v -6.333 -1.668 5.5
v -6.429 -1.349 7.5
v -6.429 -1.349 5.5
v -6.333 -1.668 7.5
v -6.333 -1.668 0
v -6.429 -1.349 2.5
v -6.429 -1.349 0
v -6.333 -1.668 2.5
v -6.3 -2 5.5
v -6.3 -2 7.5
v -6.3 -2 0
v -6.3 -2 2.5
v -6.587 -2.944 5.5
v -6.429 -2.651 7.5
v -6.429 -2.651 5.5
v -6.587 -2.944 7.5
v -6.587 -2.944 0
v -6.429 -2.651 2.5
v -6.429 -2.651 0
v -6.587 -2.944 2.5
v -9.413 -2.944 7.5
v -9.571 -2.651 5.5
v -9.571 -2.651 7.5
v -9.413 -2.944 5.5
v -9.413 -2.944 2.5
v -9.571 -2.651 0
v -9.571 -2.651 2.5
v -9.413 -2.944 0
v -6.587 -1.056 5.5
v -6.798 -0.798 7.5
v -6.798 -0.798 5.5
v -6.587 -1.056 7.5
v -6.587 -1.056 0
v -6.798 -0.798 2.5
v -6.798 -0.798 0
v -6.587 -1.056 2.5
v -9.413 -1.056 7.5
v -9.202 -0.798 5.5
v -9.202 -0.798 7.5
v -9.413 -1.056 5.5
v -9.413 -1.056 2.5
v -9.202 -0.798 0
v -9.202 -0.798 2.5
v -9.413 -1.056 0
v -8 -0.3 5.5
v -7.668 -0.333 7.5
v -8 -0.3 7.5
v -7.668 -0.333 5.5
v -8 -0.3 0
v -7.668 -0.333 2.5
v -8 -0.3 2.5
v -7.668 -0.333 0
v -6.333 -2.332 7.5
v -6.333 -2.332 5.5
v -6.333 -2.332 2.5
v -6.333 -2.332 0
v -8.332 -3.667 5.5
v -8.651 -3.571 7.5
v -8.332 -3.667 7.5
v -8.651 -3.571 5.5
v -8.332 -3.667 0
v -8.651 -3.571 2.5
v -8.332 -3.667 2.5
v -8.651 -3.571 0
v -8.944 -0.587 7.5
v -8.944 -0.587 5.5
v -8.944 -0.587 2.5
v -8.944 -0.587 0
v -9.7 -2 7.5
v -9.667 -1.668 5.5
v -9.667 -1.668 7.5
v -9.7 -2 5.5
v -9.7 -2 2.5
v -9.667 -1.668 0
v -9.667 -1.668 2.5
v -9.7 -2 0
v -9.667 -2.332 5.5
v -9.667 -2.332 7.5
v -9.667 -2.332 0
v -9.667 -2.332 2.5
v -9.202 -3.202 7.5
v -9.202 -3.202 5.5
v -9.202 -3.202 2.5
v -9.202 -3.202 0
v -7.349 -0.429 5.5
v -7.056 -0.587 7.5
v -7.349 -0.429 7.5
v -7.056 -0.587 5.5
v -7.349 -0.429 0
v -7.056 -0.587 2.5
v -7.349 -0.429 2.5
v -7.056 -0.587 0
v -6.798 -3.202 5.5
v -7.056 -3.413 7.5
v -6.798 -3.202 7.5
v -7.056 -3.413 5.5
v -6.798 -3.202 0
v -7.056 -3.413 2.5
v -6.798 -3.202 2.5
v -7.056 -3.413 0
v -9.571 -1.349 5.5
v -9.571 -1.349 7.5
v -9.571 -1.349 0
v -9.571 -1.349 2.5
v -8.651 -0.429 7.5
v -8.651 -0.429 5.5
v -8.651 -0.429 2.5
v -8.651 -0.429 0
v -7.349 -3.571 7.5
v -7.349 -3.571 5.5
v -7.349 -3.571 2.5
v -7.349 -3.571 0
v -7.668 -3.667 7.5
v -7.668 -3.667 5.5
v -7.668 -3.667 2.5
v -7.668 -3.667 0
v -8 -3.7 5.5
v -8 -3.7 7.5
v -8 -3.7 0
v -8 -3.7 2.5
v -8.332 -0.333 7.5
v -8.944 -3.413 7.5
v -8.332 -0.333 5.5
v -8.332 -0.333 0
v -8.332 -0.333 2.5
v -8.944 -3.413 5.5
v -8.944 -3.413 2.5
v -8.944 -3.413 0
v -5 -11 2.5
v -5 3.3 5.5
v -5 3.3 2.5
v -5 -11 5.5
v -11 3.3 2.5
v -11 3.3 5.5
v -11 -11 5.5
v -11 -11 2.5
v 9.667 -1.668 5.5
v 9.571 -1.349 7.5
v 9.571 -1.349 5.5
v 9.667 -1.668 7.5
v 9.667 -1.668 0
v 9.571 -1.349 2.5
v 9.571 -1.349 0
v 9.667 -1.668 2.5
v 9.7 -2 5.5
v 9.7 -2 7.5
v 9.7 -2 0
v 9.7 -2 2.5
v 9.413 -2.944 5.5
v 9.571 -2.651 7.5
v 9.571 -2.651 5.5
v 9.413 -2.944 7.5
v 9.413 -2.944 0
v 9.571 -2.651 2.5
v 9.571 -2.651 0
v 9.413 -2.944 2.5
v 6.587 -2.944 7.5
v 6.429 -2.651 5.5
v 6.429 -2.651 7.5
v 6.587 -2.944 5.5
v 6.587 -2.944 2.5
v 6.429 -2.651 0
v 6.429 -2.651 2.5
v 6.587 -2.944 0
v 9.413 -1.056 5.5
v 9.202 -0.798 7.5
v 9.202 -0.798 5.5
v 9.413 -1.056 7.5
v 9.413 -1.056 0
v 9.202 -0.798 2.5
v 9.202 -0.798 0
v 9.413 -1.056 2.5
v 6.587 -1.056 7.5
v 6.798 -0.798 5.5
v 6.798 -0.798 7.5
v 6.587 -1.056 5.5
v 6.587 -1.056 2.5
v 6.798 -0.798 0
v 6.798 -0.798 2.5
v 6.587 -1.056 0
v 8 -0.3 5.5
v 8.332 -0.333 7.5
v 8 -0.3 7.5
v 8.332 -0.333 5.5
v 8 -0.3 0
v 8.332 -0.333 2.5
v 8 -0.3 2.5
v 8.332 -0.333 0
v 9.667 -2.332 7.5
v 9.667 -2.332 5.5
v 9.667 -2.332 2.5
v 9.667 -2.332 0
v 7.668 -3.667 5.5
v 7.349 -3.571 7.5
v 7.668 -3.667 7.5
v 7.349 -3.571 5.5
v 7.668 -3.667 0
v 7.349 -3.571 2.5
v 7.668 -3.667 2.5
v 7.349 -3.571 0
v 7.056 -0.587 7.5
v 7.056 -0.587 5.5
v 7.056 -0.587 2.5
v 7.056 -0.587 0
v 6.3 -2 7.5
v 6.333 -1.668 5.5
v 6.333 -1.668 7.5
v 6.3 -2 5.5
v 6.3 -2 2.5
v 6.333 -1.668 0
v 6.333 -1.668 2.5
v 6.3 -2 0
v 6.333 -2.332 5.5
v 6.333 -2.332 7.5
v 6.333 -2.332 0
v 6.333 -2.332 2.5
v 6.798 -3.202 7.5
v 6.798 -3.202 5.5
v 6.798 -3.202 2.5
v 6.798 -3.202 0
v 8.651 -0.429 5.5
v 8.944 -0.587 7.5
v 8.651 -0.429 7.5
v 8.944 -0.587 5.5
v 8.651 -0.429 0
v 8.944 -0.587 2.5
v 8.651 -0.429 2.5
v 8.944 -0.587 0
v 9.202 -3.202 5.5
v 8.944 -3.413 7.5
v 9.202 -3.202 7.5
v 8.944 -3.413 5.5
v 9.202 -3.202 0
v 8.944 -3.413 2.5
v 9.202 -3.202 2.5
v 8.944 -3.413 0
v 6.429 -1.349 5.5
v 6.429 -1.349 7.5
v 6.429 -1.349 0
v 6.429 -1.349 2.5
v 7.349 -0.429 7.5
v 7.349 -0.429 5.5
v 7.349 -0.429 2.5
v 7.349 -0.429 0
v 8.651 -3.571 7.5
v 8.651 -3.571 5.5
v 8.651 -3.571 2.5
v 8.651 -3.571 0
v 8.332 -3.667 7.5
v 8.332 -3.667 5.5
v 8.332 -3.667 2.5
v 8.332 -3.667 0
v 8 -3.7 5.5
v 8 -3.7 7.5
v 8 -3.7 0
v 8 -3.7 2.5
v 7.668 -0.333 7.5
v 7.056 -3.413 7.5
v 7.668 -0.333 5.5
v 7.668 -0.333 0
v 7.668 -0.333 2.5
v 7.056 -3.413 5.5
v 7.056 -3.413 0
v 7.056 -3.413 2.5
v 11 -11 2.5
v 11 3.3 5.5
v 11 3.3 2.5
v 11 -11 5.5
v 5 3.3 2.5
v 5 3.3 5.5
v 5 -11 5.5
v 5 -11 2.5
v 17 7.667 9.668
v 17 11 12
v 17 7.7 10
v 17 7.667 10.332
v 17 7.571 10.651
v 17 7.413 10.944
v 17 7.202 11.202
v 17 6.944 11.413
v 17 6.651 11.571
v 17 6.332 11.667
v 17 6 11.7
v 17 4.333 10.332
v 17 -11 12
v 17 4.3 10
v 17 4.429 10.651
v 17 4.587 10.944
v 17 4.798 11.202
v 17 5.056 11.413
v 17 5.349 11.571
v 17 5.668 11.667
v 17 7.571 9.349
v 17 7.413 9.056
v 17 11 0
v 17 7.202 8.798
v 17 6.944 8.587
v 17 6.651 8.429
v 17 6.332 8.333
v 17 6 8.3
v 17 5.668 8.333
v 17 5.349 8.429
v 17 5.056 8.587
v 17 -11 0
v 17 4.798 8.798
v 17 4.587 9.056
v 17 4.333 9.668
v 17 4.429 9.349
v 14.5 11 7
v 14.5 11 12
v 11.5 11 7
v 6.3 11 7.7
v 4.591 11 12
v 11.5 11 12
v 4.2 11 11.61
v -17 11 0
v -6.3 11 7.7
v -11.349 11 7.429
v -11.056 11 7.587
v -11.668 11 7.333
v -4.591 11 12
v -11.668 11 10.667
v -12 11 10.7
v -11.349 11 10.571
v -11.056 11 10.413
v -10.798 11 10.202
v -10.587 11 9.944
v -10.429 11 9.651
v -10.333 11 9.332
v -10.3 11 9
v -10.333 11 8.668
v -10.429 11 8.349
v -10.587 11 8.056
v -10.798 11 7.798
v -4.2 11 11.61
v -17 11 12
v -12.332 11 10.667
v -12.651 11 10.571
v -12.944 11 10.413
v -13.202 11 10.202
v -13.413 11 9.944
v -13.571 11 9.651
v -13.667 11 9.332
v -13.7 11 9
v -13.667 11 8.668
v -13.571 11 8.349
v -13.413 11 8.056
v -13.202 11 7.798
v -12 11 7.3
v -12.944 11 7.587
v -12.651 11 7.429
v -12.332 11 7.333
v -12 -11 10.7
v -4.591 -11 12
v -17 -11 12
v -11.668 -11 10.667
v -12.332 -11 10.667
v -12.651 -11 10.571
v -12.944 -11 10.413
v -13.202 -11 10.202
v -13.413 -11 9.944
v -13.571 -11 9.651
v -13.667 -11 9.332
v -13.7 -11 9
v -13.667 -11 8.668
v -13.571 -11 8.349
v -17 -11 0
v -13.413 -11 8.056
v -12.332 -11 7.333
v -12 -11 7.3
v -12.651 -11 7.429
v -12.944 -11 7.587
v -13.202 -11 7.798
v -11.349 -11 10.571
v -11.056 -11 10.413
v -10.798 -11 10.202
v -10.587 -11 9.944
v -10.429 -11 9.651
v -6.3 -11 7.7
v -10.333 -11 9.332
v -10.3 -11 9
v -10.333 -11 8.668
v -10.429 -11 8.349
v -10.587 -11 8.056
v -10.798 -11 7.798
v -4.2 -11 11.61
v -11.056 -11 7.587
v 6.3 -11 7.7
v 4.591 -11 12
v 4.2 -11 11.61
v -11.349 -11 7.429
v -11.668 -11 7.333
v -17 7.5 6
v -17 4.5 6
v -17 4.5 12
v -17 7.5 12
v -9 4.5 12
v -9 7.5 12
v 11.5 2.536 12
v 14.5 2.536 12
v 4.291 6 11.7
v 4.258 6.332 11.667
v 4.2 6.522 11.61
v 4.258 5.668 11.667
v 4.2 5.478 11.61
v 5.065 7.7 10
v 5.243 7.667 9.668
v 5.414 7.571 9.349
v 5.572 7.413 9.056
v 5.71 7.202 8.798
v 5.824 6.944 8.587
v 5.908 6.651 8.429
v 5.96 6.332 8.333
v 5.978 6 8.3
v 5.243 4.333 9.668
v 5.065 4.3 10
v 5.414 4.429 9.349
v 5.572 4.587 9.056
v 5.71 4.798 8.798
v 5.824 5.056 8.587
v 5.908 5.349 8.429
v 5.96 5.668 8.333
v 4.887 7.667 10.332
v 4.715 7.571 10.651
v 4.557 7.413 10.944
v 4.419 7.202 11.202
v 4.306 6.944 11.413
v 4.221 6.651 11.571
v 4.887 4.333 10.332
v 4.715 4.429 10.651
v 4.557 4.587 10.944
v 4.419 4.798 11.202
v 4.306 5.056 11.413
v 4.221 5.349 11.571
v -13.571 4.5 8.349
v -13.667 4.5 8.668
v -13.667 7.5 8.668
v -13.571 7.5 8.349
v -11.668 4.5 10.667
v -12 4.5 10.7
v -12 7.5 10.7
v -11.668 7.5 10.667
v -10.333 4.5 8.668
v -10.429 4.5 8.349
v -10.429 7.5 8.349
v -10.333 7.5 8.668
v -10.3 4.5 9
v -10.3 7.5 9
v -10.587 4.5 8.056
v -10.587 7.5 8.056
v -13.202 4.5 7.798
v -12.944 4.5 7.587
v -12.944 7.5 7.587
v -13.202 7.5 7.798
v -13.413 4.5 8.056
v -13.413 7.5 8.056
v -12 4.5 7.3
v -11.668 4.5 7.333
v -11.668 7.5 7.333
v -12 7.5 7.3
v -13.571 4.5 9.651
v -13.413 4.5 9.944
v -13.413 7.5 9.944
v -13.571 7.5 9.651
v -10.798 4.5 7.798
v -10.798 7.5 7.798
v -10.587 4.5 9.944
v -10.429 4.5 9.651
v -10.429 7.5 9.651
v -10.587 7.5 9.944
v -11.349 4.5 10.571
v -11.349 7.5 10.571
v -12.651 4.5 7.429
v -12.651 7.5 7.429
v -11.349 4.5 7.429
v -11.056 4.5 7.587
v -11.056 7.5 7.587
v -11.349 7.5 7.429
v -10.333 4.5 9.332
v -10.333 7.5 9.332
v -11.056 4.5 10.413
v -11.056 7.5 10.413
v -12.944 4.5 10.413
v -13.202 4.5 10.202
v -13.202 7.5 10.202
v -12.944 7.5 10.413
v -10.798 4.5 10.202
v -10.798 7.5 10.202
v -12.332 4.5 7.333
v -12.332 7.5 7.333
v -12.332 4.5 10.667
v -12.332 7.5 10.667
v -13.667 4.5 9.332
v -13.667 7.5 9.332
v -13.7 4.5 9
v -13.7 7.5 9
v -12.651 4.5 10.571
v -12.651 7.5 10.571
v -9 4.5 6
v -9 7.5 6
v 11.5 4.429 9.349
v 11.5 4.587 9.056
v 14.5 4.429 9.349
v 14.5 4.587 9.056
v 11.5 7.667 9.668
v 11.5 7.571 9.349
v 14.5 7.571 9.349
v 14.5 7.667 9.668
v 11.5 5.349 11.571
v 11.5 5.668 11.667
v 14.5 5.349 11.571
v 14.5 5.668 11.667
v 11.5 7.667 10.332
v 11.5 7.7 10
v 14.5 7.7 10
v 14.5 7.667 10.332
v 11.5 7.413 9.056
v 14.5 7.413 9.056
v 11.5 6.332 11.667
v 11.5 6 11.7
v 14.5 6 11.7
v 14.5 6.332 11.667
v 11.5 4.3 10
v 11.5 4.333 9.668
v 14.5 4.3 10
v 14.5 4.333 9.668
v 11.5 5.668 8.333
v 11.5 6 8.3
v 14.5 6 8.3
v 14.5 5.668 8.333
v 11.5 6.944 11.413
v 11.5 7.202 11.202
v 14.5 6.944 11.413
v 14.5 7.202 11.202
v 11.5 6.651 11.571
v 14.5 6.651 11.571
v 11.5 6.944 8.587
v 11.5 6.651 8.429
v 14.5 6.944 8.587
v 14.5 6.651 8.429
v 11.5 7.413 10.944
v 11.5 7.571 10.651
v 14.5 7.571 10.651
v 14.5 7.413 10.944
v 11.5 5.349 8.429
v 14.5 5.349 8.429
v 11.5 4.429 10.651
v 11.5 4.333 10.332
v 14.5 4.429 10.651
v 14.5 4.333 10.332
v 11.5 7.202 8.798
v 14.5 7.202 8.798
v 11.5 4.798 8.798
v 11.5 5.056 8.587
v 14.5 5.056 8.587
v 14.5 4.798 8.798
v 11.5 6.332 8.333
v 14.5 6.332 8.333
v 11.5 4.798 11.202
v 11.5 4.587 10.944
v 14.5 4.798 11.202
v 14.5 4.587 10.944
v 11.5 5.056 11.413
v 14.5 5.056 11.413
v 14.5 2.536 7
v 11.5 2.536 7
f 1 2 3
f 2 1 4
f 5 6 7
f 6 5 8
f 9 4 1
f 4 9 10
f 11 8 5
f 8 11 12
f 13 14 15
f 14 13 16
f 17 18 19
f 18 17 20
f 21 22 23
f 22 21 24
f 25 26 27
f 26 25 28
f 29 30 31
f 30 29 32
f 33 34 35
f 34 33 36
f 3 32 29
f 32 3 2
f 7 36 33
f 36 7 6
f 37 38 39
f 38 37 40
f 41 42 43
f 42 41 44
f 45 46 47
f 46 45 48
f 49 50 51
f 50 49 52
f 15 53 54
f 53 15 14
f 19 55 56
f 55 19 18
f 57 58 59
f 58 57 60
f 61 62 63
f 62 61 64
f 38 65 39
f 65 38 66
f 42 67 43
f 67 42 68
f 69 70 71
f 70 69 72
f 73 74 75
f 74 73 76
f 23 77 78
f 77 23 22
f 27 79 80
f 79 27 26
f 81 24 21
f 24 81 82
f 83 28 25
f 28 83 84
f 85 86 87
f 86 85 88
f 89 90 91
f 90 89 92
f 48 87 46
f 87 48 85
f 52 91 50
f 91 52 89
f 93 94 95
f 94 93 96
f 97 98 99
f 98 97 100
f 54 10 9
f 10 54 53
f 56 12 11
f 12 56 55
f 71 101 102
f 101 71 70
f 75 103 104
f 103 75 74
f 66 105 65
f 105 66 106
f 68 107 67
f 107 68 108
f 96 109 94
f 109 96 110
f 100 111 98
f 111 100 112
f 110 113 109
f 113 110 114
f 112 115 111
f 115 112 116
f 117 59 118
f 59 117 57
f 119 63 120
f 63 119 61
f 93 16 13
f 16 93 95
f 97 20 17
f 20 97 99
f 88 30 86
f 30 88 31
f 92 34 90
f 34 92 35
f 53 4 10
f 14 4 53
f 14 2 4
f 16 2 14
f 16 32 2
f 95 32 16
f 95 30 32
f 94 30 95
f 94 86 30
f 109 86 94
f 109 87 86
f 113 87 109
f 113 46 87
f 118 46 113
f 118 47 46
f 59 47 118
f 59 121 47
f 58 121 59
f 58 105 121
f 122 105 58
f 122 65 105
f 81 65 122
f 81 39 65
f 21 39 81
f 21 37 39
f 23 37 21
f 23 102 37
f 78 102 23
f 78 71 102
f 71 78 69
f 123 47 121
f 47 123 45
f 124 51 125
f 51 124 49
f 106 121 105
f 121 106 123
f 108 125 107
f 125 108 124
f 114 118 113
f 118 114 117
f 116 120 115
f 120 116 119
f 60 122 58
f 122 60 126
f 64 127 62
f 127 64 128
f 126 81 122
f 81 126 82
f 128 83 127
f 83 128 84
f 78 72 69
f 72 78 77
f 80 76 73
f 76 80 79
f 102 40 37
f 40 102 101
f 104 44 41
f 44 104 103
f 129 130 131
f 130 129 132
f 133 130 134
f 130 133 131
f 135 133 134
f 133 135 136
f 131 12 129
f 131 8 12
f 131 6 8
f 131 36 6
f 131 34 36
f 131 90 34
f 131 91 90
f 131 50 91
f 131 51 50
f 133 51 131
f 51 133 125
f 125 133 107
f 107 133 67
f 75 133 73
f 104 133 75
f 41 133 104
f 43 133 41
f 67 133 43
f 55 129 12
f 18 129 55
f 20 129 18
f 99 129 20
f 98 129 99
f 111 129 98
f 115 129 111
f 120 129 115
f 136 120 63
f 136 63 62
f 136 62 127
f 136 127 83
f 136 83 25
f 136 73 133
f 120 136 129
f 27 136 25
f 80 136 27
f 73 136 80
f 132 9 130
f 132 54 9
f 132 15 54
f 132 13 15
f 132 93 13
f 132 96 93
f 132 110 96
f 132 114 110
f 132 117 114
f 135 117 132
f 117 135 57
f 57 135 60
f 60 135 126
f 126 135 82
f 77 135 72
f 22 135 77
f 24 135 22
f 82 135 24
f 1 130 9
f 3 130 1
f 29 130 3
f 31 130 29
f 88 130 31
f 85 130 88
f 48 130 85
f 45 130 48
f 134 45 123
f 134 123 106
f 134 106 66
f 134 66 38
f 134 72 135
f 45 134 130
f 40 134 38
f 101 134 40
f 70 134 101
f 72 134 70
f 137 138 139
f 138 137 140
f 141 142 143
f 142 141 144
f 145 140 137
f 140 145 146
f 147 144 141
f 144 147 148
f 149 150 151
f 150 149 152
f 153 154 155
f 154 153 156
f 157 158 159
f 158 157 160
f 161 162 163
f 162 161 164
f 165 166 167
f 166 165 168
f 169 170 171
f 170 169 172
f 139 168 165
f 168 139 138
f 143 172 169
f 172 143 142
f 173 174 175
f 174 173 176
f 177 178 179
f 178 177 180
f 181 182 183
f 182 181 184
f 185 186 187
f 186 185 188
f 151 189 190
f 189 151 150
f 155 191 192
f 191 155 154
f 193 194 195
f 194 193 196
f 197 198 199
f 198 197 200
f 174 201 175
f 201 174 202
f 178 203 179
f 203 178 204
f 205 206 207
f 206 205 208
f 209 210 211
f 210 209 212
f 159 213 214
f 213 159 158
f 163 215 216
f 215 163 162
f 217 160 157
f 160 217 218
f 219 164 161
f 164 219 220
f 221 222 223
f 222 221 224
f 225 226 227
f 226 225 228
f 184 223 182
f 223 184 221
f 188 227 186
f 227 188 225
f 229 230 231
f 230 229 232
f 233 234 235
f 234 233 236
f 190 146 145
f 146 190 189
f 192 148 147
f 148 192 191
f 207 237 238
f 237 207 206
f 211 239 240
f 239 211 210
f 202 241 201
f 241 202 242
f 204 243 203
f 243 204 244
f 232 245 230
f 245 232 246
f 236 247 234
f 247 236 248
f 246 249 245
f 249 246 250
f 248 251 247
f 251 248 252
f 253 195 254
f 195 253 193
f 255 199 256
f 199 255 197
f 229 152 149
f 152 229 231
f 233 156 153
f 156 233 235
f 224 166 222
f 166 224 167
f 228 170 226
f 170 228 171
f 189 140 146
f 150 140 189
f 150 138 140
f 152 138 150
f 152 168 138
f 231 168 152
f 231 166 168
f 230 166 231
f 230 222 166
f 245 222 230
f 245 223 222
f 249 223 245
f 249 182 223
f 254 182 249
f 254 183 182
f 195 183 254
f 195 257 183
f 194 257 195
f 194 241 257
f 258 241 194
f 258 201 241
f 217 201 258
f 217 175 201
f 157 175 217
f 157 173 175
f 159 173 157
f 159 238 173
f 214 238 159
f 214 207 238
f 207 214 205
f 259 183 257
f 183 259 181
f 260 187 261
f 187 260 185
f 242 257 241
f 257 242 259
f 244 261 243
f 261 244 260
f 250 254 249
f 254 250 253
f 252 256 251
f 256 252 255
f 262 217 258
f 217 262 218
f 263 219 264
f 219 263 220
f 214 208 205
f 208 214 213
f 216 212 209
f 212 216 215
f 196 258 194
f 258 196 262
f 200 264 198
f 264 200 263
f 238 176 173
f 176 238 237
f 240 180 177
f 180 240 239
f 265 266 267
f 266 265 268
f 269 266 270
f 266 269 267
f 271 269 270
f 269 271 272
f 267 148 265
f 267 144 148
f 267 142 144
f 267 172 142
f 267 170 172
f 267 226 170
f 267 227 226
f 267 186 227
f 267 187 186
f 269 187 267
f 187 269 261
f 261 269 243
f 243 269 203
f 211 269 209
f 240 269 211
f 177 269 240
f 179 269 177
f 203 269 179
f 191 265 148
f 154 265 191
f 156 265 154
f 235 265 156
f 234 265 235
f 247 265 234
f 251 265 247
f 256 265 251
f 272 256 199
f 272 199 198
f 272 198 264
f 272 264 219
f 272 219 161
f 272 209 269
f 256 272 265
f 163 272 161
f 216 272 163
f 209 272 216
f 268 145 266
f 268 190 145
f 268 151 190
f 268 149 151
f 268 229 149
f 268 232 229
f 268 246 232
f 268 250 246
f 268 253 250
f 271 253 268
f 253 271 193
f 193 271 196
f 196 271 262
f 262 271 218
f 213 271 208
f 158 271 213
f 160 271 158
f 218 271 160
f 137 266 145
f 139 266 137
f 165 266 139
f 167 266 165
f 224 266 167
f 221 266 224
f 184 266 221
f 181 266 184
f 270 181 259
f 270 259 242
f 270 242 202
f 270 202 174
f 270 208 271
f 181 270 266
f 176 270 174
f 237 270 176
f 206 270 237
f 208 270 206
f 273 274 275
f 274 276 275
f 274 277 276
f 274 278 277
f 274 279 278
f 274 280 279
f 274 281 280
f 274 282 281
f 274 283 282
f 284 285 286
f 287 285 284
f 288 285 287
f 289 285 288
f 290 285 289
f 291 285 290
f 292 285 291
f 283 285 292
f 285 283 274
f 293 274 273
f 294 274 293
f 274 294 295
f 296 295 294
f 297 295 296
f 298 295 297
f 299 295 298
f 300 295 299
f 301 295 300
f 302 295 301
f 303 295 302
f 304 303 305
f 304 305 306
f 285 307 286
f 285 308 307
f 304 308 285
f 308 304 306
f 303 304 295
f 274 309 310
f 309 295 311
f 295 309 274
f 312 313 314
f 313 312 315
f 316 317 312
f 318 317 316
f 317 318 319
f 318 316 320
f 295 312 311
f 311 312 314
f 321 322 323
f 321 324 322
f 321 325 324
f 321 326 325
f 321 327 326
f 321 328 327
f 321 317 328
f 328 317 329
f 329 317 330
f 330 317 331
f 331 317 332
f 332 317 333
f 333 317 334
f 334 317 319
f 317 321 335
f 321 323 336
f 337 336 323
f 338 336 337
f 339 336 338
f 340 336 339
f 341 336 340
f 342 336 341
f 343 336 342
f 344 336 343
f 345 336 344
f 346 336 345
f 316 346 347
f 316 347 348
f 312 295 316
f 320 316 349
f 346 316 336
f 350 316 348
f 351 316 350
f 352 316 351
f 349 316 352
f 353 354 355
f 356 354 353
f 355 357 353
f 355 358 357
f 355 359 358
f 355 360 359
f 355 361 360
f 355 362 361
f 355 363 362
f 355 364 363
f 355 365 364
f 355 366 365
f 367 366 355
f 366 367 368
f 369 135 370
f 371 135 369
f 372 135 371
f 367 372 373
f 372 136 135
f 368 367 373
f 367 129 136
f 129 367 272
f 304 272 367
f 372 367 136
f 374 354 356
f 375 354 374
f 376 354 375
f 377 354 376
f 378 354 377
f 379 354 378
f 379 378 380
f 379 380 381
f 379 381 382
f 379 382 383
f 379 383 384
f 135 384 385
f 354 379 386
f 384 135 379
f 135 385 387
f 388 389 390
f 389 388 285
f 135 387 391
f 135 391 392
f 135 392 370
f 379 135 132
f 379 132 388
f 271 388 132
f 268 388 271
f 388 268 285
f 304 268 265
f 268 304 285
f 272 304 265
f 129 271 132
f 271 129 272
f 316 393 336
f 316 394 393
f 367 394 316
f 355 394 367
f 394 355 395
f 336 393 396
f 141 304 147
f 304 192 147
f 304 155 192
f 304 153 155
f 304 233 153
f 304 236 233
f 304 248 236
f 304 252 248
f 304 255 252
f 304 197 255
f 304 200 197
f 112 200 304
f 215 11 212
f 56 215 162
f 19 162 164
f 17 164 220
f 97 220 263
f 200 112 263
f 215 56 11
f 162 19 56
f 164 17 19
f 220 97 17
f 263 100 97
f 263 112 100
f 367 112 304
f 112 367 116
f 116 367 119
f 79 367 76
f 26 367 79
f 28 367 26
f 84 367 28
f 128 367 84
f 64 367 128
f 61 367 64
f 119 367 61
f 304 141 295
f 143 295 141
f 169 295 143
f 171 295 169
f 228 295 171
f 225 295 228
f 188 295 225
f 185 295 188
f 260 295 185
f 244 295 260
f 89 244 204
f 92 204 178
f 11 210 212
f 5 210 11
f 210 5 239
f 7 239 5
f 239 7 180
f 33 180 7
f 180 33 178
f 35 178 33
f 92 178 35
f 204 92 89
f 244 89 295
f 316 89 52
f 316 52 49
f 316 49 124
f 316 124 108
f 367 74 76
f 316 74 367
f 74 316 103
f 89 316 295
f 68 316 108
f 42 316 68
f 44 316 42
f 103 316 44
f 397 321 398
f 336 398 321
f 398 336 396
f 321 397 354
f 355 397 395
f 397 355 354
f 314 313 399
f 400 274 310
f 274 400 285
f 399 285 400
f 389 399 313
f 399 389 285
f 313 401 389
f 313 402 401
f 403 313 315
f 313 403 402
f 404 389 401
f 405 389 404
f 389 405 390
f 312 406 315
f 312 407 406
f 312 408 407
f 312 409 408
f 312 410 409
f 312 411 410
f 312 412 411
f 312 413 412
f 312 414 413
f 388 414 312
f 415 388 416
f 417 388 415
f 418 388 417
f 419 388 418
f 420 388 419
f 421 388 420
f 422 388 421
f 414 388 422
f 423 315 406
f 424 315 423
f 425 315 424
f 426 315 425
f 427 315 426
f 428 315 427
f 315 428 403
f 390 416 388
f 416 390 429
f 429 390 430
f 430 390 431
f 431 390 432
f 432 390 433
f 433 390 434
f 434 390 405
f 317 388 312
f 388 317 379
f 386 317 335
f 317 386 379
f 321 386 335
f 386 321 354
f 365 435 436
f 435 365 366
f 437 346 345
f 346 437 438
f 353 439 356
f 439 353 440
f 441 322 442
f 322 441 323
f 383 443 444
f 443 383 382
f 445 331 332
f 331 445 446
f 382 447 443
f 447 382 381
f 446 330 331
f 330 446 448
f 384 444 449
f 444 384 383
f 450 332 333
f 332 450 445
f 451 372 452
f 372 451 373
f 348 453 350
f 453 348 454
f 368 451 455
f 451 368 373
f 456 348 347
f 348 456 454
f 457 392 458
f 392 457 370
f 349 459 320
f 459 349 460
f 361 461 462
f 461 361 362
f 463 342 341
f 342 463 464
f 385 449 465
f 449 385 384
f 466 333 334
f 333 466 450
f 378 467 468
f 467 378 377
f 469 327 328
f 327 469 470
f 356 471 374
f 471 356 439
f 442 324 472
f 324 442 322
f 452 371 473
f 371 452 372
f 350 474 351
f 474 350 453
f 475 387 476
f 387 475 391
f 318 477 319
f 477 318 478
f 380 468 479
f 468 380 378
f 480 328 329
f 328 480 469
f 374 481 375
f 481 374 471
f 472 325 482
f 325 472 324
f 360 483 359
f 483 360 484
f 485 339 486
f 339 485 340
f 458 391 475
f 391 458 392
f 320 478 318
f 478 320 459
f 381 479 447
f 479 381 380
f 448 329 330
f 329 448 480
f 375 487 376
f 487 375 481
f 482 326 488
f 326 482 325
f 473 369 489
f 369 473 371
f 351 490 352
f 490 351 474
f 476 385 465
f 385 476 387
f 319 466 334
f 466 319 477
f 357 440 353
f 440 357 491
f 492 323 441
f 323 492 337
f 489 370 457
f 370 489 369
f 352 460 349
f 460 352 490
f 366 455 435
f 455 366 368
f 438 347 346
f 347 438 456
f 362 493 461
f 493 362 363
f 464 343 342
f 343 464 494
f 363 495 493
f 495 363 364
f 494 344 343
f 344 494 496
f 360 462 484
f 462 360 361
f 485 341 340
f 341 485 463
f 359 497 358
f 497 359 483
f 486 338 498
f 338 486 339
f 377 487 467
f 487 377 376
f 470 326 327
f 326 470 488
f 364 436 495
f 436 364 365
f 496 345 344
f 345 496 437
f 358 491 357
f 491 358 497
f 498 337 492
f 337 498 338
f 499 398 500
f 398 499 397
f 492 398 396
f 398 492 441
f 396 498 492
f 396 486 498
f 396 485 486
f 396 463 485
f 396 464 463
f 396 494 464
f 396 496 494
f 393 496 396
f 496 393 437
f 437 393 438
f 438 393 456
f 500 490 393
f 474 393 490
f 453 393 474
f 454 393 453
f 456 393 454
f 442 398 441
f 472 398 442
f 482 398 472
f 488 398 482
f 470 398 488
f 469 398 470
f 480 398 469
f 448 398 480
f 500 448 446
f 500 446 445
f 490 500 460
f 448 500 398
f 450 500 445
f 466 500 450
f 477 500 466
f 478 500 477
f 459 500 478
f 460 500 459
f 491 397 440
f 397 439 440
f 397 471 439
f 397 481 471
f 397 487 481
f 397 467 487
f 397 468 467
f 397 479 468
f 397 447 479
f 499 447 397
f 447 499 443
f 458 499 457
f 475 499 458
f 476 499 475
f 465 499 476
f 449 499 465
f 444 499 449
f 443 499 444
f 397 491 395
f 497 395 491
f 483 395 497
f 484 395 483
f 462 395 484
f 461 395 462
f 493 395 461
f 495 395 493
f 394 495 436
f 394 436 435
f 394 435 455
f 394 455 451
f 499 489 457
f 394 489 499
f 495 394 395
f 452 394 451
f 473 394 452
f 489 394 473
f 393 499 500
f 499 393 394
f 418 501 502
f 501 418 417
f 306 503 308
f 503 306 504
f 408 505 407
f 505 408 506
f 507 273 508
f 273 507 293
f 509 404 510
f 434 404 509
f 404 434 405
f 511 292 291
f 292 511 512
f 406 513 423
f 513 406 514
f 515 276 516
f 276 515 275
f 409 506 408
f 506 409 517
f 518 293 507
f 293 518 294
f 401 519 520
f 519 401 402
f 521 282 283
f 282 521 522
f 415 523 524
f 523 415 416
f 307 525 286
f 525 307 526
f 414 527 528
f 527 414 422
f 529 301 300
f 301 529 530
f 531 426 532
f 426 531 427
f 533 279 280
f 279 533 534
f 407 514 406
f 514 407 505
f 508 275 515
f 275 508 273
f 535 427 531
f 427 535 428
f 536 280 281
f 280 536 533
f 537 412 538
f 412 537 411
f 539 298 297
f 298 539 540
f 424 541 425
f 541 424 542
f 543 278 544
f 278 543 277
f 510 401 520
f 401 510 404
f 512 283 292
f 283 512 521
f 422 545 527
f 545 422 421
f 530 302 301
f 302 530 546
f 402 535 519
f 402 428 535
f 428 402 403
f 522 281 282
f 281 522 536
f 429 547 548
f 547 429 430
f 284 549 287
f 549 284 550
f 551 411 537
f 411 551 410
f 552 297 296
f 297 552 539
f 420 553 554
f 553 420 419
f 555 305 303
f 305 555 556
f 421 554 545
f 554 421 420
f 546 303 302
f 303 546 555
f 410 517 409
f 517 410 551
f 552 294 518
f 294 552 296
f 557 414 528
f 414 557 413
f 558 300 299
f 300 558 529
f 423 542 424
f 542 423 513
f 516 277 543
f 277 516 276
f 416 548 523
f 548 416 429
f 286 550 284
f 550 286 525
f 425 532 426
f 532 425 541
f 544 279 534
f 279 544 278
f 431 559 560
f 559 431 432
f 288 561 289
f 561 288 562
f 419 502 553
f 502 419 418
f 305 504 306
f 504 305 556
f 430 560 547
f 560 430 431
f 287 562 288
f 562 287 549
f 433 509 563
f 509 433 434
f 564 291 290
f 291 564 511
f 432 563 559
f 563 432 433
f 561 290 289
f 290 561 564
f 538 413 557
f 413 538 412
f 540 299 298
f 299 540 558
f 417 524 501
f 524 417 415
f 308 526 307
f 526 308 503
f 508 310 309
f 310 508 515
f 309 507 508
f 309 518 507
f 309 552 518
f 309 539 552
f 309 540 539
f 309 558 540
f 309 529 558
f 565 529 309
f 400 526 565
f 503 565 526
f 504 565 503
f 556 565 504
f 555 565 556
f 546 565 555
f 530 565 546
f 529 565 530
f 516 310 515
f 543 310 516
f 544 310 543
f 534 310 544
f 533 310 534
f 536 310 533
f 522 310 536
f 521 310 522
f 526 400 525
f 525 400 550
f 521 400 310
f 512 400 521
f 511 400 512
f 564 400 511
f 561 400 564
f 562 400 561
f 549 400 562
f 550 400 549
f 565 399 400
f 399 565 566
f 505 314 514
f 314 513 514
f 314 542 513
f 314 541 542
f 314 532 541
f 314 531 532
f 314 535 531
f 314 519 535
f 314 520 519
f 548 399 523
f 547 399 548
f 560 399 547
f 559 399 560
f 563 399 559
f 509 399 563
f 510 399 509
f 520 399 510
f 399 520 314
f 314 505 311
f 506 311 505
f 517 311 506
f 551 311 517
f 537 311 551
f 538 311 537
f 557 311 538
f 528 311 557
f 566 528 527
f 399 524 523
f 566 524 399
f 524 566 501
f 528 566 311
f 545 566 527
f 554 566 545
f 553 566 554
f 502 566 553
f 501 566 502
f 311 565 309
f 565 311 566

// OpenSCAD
// file: ../stage.scad
// ============================================================
//  Positioning stage: base (X dovetail) -> x-slider with column
//  (Z dovetail) -> z-slider (payload face toward +Y) + column cap.
//  Every axis: M3 adjust screw captured in the fixed part by head +
//  nylock, threading into a captive nut in the moving part
//  (0.5 mm/turn, both directions), plus an M3 lock screw.
//  Modules model parts in stage-local coordinates at mid travel.
// ============================================================
include <lib.scad>

// Dovetail standing on the column's +Y face, running along Z.
// multmatrix maps (x,y,z) -> (y,z,x): run->Z, width->X, height->Y.
module zrail_frame() { multmatrix([[0,1,0,0],[0,0,1,0],[1,0,0,0]]) children(); }

module stage_base() {
    rail_x0 = -stage_L / 2;
    rail_len = stage_L - stage_tab_t;
    tab_h = stage_base_h + xs_screw_z + 6;
    difference() {
        union() {
            translate([-stage_L / 2, -stage_D / 2, 0]) cube([stage_L, stage_D, stage_base_h]);
            translate([rail_x0, 0, stage_base_h]) dovetail_rail(rail_len);
            // adjust-screw tab
            translate([stage_L / 2 - stage_tab_t, -8, 0]) cube([stage_tab_t, 16, tab_h]);
        }
        wood_screw_holes(stage_mount_pts, stage_base_h, cbore = 3);
        // X adjust screw through tab (head outside, nylock inside)
        translate([stage_L / 2 - stage_tab_t - 1, 0, stage_base_h + xs_screw_z])
            rotate([0, 90, 0]) screw_hole(m3_d, stage_tab_t + 2);
    }
}

// Upper stack shares the x-slider's X offset.
module stage_x_slider() {
    x0 = xs_xc - xs_len / 2;
    difference() {
        union() {
            translate([x0, -xs_w / 2, stage_base_h]) cube([xs_len, xs_w, xs_h]);
            // column
            translate([xs_xc - col_w / 2, col_y0, xs_top - 0.01]) cube([col_w, col_t, col_h + 0.01]);
            translate([xs_xc, col_y1, xs_top]) zrail_frame() dovetail_rail(col_h);
        }
        translate([x0 - 1, 0, stage_base_h]) dovetail_slot(xs_len + 2);
        // X adjust: screw enters +X face, nut dropped in from the top
        translate([x0 + xs_len + 0.01, 0, stage_base_h + xs_screw_z]) rotate([0, -90, 0])
            screw_hole(m3_d, xs_adj_hole);
        translate([x0 + xs_len - 6 - m3_nut_t / 2, -(m3_nut_af + clr) / 2, stage_base_h + xs_screw_z - 3.5])
            cube([m3_nut_t + 0.4, m3_nut_af + clr, xs_h]);
        // X lock: horizontal from +Y face onto rail flank, nut from top
        translate([xs_xc + 8, xs_w / 2 + 0.01, stage_base_h + 2.5]) rotate([90, 0, 0])
            screw_hole(m3_d, xs_w / 2 - 3);
        translate([xs_xc + 8 - (m3_nut_af + clr) / 2, 9 - (m3_nut_t + 0.4) / 2, stage_base_h + 2.5 - 3.3])
            cube([m3_nut_af + clr, m3_nut_t + 0.4, xs_h]);
        // cap screws (tapped into column top)
        for (sx = [-8, 8]) translate([xs_xc + sx, col_y0 + 5, col_top - 10])
            screw_hole(m3_tap, 10.1);
    }
}

module stage_z_slider() {
    y0 = col_y1;
    x0 = xs_xc - zs_w / 2;
    difference() {
        translate([x0, y0, zs_z0]) cube([zs_w, zs_t, zs_h]);
        translate([xs_xc, col_y1, zs_z0 - 1]) zrail_frame() dovetail_slot(zs_h + 2);
        // payload holes + nut slots from the bottom
        for (p = payload_pts) {
            translate([xs_xc + p[0], payload_face_y + 0.01, stage_payload_z + p[1]])
                rotate([90, 0, 0]) screw_hole(m3_d, 7.5);
            translate([xs_xc + p[0] - (m3_nut_af + clr) / 2, payload_face_y - 4 - (m3_nut_t + 0.4) / 2, zs_z0 - 1])
                cube([m3_nut_af + clr, m3_nut_t + 0.4, zs_h / 2 + 1 + 3.3]);
        }
        // Z adjust: through hole, nut slot from the -X side 5 below the top
        translate([xs_xc + zs_screw_x, zs_screw_y, zs_z0 + zs_h - zs_adj_hole]) screw_hole(m3_d, zs_adj_hole + 0.1);
        translate([x0 - 1, zs_screw_y - (m3_nut_af + clr) / 2, zs_z0 + zs_h - 5 - (m3_nut_t + 0.4) / 2])
            cube([zs_screw_x + zs_w / 2 + 1 + (m3_nut_af + clr) / 2, m3_nut_af + clr, m3_nut_t + 0.4]);
        // Z lock: from the +X (outward) side onto the rail flank, nut dropped in from the top
        lz = zs_z0 + zs_h - 5;
        x1 = x0 + zs_w;
        translate([x1 + 0.01, col_y1 + 2, lz]) rotate([0, -90, 0]) screw_hole(m3_d, zs_w / 2 - 4);
        translate([x1 - 2.5 - (m3_nut_t + 0.4), col_y1 + 2 - zl_pocket_w / 2, lz - (m3_nut_af + clr) / 2 / cos(30)])
            cube([m3_nut_t + 0.4, zl_pocket_w, zs_h]);
    }
}

module stage_z_cap() {
    difference() {
        // stops 1 mm short of the payload face so the payload never rubs it
        translate([xs_xc - col_w / 2, col_y0, col_top]) cube([col_w, payload_face_y - col_y0 - 1, cap_t]);
        for (sx = [-8, 8]) translate([xs_xc + sx, col_y0 + 5, col_top]) screw_hole(m3_d, cap_t);
        translate([xs_xc + zs_screw_x, zs_screw_y, col_top]) screw_hole(m3_d, cap_t);
    }
}

// ---- placed at a fine-travel offset (dx, dz) ----
module stage_x_slider_placed(dx = 0) { translate([dx, 0, 0]) stage_x_slider(); }
module stage_z_cap_placed(dx = 0)    { translate([dx, 0, 0]) stage_z_cap(); }
module stage_z_slider_placed(dx = 0, dz = 0) { translate([dx, 0, dz]) stage_z_slider(); }

// Children placed at the payload face centre (origin on the face, +Y out).
module stage_payload_origin(dx = 0, dz = 0) {
    translate([xs_xc + dx, payload_face_y, stage_payload_z + dz]) children();
}

// Optional mirror (tower B) wraps the stage-local geometry.
module stage_hand(mir) { if (mir) mirror([1, 0, 0]) children(); else children(); }

module stage_assembly(dx = 0, dz = 0) {
    color("SteelBlue") stage_base();
    color("LightSteelBlue") stage_x_slider_placed(dx);
    color("SkyBlue") stage_z_cap_placed(dx);
    color("CadetBlue") stage_z_slider_placed(dx, dz);
}

// ---- travel checks ----
_right_gap = (stage_L / 2 - stage_tab_t) - (xs_xc + xs_len / 2) - locknut_t;
_left_ok   = 10;   // slider may overhang the rail start by up to 10 mm
echo("CHECK", "stage_travel_x", 2 * min(_right_gap, _left_ok));
// adjust screws: head on the fixed tab/cap, tip must pass the moving nut
// at the far travel end and stay inside the hole at the near end
_xnut = xs_xc + xs_len / 2 - 6;                  // nut centre X at mid
_xtip = stage_L / 2 - x_adj_len;
echo("CHECK", "x_adj_engage", (_xnut - stage_travel - (m3_nut_t + 0.4) / 2) - _xtip);
echo("CHECK", "x_adj_hole", _xtip - (xs_xc + xs_len / 2 + stage_travel - xs_adj_hole));
_znut = zs_z0 + zs_h - 5;
_ztip = stage_top_z - z_adj_len;
echo("CHECK", "z_adj_engage", (_znut - stage_travel - (m3_nut_t + 0.4) / 2) - _ztip);
echo("CHECK", "z_adj_hole", _ztip - (zs_z0 + zs_h + stage_travel - zs_adj_hole));
echo("CHECK", "z_lock_pocket_w", zl_pocket_w);
echo("CHECK", "stage_travel_z", 2 * min(stage_gap_z, cap_gap - locknut_t));
// main file
// Positioning stage z-slider. Printed lying on its payload face. Qty 3 (one with mirrored = true, for port tower B).
include <../stage.scad>
/* [Options] */
// true for port tower B (mirror image, X adjust screw faces outward)
mirrored = false;

stage_hand(mirrored) rotate([-90, 0, 0]) translate([-xs_xc, -payload_face_y, -stage_payload_z]) stage_z_slider();
